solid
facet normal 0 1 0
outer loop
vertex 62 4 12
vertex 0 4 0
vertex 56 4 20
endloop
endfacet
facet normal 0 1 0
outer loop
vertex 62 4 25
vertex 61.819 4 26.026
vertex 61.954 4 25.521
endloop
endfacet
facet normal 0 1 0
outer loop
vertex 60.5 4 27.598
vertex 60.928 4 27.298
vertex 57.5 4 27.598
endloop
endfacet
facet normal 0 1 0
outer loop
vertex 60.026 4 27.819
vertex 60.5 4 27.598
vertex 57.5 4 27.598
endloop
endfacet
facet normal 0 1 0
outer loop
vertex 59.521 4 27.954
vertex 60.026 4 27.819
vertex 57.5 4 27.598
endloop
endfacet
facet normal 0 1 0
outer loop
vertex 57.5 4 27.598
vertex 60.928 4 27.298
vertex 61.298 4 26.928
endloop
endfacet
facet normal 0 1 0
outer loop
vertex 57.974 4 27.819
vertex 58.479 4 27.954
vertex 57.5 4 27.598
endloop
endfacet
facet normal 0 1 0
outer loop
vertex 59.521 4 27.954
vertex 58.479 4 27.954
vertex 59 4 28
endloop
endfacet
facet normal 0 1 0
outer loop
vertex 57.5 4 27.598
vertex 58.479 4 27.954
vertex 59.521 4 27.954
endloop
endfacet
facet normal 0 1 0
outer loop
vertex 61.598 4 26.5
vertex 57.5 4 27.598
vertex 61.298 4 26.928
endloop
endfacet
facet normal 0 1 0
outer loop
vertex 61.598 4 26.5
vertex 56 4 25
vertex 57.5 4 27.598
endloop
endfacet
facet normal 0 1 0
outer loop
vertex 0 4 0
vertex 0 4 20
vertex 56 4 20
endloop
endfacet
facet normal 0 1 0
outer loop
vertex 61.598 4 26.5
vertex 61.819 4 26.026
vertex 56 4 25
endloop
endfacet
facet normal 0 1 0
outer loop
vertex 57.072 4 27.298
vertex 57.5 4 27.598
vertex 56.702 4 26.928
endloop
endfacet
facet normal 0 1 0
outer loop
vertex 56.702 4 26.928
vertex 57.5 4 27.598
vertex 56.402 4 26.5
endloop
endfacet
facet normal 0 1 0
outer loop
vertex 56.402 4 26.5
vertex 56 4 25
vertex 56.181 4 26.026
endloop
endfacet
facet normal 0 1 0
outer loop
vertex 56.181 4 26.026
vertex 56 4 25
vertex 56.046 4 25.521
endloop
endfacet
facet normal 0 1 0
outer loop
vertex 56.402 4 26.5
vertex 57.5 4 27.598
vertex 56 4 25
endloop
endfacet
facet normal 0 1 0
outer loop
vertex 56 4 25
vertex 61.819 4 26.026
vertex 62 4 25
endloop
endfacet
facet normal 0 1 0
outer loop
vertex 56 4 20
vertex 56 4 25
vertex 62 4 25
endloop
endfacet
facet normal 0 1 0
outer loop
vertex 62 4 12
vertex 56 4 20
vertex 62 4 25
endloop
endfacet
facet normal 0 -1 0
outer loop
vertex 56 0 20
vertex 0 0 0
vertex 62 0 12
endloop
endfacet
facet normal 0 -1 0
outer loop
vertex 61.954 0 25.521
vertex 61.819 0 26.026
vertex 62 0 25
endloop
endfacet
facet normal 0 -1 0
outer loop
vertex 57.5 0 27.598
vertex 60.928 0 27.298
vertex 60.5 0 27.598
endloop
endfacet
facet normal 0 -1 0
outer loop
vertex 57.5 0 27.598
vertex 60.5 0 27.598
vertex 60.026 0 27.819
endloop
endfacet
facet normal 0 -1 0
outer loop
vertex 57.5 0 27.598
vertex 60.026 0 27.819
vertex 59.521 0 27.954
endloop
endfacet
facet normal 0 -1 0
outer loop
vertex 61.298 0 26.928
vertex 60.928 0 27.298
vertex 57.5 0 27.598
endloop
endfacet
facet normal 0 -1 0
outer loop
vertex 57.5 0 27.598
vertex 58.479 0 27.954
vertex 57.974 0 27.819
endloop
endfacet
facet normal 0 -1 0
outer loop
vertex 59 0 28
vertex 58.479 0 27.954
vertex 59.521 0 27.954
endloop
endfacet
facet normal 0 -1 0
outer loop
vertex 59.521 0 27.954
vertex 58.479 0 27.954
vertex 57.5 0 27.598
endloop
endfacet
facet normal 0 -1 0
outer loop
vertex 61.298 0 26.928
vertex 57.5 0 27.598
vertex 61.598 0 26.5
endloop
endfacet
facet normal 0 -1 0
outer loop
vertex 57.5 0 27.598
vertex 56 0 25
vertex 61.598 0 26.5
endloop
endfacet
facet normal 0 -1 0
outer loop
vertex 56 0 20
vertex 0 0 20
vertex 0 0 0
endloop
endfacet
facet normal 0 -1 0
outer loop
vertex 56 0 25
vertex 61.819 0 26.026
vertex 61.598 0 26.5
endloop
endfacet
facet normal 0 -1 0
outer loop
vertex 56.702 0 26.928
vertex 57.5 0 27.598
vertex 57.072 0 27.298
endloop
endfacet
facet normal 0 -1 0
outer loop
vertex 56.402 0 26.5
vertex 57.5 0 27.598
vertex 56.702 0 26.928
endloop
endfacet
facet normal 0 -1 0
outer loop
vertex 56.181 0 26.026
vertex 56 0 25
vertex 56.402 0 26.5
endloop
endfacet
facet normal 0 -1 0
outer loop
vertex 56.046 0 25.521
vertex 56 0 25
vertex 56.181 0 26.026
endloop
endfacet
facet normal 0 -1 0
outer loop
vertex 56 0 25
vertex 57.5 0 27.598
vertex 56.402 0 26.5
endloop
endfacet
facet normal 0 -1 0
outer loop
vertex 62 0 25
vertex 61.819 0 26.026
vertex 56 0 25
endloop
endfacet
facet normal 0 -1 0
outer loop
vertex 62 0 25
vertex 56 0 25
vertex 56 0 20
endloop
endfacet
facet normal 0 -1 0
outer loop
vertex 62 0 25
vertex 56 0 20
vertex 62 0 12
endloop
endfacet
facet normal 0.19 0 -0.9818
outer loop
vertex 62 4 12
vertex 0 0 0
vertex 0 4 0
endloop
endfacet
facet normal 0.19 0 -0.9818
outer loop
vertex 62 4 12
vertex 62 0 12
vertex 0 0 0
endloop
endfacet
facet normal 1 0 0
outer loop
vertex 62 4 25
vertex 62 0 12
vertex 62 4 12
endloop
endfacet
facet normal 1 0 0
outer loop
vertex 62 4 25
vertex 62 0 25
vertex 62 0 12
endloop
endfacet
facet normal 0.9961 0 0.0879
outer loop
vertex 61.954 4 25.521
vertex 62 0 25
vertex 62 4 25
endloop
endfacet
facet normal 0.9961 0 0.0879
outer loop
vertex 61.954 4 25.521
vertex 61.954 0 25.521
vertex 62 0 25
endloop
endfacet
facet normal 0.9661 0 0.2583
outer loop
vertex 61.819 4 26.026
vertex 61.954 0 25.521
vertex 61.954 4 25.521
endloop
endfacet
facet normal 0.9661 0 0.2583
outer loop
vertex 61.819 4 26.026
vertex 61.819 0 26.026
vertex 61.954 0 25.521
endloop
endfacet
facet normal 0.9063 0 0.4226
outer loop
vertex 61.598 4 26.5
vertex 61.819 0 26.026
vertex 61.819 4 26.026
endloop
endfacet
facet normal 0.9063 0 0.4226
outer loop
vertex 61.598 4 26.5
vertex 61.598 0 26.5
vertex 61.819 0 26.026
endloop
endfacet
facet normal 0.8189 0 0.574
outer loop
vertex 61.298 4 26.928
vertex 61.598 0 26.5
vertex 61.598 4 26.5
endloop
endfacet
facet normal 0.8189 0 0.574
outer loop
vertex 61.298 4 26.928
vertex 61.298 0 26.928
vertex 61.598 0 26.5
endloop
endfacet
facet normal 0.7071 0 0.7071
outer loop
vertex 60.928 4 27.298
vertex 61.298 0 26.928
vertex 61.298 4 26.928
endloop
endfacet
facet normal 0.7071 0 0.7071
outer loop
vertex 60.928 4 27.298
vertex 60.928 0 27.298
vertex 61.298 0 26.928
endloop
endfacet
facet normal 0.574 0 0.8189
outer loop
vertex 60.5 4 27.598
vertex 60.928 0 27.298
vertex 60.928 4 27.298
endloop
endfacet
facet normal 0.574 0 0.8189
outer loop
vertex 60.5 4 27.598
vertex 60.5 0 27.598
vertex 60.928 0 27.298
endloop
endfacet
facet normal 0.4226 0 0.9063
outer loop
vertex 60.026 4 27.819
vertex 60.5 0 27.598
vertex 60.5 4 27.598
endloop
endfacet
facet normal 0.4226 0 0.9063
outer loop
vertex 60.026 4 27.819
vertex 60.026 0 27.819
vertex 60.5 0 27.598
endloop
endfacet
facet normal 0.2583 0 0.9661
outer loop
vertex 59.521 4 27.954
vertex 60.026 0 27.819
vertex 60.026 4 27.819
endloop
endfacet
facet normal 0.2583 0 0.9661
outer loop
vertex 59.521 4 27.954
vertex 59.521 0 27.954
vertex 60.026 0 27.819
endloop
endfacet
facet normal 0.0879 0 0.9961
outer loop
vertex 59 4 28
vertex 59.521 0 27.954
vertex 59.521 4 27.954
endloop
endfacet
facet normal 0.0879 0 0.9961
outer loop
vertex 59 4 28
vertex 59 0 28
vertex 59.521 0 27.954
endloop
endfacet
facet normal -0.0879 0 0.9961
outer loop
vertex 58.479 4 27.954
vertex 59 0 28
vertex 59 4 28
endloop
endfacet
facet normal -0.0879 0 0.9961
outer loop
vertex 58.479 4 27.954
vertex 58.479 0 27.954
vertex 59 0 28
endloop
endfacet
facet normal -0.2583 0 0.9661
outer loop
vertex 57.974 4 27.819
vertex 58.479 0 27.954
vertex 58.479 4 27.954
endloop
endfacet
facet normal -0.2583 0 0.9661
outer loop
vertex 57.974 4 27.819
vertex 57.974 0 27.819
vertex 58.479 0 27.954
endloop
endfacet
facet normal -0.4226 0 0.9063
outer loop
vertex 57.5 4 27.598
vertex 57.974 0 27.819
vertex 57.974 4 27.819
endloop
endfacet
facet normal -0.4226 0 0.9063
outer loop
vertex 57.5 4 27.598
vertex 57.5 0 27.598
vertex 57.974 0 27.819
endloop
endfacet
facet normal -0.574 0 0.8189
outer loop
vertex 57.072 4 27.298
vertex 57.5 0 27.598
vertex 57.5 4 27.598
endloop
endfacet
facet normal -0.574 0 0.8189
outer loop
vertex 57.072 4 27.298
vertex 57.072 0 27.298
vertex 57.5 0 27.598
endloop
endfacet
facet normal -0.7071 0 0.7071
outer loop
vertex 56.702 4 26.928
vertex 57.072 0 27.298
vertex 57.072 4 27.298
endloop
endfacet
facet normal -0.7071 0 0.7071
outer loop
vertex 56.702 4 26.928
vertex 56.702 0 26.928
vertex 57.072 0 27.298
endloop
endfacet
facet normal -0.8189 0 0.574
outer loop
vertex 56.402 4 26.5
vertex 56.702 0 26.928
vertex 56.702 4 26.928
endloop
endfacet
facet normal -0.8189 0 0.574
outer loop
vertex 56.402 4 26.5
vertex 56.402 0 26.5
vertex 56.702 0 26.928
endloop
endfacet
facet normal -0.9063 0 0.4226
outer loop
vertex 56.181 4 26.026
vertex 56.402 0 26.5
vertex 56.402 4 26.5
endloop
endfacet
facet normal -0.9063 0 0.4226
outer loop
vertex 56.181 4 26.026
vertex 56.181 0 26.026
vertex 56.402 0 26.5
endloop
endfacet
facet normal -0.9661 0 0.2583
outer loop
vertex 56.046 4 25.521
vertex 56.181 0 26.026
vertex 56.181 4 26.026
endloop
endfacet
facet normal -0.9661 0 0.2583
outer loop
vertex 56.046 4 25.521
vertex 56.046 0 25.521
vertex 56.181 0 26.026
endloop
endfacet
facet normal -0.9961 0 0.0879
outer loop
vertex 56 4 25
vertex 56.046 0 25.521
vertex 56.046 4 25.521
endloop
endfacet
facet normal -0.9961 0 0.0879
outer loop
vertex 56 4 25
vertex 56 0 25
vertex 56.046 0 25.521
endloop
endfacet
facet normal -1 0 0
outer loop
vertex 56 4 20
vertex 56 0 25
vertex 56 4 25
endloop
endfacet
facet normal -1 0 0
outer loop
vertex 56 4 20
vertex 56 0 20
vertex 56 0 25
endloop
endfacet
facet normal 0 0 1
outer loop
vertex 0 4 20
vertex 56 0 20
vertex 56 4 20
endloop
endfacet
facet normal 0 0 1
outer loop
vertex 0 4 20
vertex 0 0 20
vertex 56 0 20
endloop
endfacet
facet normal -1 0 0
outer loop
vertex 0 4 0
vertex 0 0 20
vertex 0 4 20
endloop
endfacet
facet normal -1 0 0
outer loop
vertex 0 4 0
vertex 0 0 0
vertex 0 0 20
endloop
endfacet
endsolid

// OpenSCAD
// file: Parametric_Pegboard_Base.scad
// FROM: https://www.thingiverse.com/thing:2583402

 // What size are the holes that we'll be going into?  Standard U.S. pegboard holes are 0.25" diameter
 hole_size = 0.25 * 25.4;

 // How far undersized should the pegs be to actually fit in the holes?
 peg_clearance = 0.25;

 // How thick is your pegboard?
 peg_height = 0.125 * 25.4;

 // What angle should the top pegs be bent at?
 peg_angle = 60;

 // Hole spacing.  Standard pegboard holes are 1" on center
 hole_center_to_center = 1 * 25.4;

 // How many rows of pegs?
 peg_rows = 2;

 // How many columns of pegs?
 peg_cols = 2;

 // How thick do you want the base?
 base_depth = 5;

 // ------------------- END PARAMETERS -----------------

//pegboard_base(peg_cols, peg_rows, hole_center_to_center, peg_height, base_depth, hole_size, peg_clearance, peg_angle);

//pegboard_base();

module pegboard_base(
cols = peg_cols,
rows = peg_rows,
spacing = hole_center_to_center,
height = peg_height,
depth = base_depth,
hole_size = hole_size,
clearance = peg_clearance,
angle = peg_angle)

{
    radius = hole_size / 2 - clearance;

    translate([spacing * (cols - 0.5), -depth, spacing / 2])
    rotate([180,180,0])
    {
        translate([-spacing / 2, -depth, -spacing / 2])
        cube([cols * spacing, depth, rows * spacing]);
        peg_grid(cols, rows, spacing, height, radius, angle);
    }
}

module peg_grid(cols, rows, spacing, height, radius, angle)
{
    for(row = [0 : rows - 2])
    {
        translate([0,0, row * spacing])
        peg_row(cols, spacing, height, radius);
    }

    translate([0, 0, (rows - 1) * spacing])
    top_peg_row(cols, spacing, height, radius, angle);
}

module top_peg_row(cols, spacing, height, radius, angle)
{
    peg_row(cols, spacing, height, radius, angle);
}

module peg_row(cols, spacing, height, radius, angle = 0)
{
    for(col = [0 : cols - 1])
    {
        translate([col * spacing, 0, 0])
        if(angle == 0) {
            rounded_peg(radius, height);
        } else {
            top_peg(radius, height, angle);
        }
    }
}

module top_peg(radius, height, angle = 60)
{
    rotate([0, 90, 0])
    {
        // Base peg
        peg(radius, height);

        // Bend
        translate([-2 * radius, height, 0])
        rotate_extrude2(angle = angle)
        translate([2 * radius, 0])
        circle(r = radius);

        // Extended peg
        translate([-2 * radius, height, 0])
        rotate([0,0,angle])
        translate([2 * radius, 0, 0])
        rounded_peg(radius, height);
        }
}

module rounded_peg(radius, height)
{
    peg(radius, height);
    translate([0, height, 0])
    sphere(r = radius);
}

module peg(radius, height)
{
    rotate([-90, 0, 0])
    cylinder(r = radius, h = height);
}

  //-------------- EXTERNAL MODULES -------------------

  // http://forum.openscad.org/rotate-extrude-angle-always-360-td19035.html
  module rotate_extrude2(angle=360, convexity=2, size=1000) {

  module angle_cut(angle=90,size=1000) {
    x = size*cos(angle/2);
    y = size*sin(angle/2);
    translate([0,0,-size])
      linear_extrude(2*size) polygon([[0,0],[x,y],[x,size],[-size,size],[-size,-size],[x,-size],[x,-y]]);
  }

  // support for angle parameter in rotate_extrude was added after release 2015.03
  // Thingiverse customizer is still on 2015.03
  angleSupport = (version_num() > 20150399) ? true : false; // Next openscad releases after 2015.03.xx will have support angle parameter
  // Using angle parameter when possible provides huge speed boost, avoids a difference operation

  if (angleSupport) {
    rotate_extrude(angle=angle,convexity=convexity)
      children();
  } else {
    rotate([0,0,angle/2]) difference() {
      rotate_extrude(convexity=convexity) children();
      angle_cut(angle, size);
    }
  }
}
// main file
$fn = 36;
// from: https://www.thingiverse.com/thing:2583402
use <Parametric_Pegboard_Base.scad>;

/*
cols = 2;
base_width = 25.4 * cols;
base_height = 24.4 * 2;
corner_radius = 2;

translate([0,-1.01,0]){
  mirror([0,1,0]) {
    pegboard_base(cols, 2, clearance=0.5, height=2.5, angle=45, depth=4);
  }
}
*/

module arm(length, back_height, front_height, thickness, tip_height=0, tip_width=0) {
  translate([0,thickness,0]) {
    rotate([90,0,0]) {
      linear_extrude(height=thickness) {
        polygon(points=[ [0,0], [0, back_height], [length, back_height], [length, back_height - front_height] ]);
        if(tip_width > 0) {
          tip_r = tip_width / 2;
          polygon(points=[
            [length, back_height],
            [length - tip_width, back_height],
            [length - tip_width, back_height + (tip_height - tip_r)],
            [length, back_height + (tip_height - tip_r)],
          ]);
          translate([length - tip_r,back_height + (tip_height - tip_r),0]) {
            circle(d=tip_width);
          }
        }
      }
    }
  }
}

// need 5.5mm gap between arms
arm(length=62, back_height=20, front_height=8, thickness=4, tip_height=8, tip_width=6);
